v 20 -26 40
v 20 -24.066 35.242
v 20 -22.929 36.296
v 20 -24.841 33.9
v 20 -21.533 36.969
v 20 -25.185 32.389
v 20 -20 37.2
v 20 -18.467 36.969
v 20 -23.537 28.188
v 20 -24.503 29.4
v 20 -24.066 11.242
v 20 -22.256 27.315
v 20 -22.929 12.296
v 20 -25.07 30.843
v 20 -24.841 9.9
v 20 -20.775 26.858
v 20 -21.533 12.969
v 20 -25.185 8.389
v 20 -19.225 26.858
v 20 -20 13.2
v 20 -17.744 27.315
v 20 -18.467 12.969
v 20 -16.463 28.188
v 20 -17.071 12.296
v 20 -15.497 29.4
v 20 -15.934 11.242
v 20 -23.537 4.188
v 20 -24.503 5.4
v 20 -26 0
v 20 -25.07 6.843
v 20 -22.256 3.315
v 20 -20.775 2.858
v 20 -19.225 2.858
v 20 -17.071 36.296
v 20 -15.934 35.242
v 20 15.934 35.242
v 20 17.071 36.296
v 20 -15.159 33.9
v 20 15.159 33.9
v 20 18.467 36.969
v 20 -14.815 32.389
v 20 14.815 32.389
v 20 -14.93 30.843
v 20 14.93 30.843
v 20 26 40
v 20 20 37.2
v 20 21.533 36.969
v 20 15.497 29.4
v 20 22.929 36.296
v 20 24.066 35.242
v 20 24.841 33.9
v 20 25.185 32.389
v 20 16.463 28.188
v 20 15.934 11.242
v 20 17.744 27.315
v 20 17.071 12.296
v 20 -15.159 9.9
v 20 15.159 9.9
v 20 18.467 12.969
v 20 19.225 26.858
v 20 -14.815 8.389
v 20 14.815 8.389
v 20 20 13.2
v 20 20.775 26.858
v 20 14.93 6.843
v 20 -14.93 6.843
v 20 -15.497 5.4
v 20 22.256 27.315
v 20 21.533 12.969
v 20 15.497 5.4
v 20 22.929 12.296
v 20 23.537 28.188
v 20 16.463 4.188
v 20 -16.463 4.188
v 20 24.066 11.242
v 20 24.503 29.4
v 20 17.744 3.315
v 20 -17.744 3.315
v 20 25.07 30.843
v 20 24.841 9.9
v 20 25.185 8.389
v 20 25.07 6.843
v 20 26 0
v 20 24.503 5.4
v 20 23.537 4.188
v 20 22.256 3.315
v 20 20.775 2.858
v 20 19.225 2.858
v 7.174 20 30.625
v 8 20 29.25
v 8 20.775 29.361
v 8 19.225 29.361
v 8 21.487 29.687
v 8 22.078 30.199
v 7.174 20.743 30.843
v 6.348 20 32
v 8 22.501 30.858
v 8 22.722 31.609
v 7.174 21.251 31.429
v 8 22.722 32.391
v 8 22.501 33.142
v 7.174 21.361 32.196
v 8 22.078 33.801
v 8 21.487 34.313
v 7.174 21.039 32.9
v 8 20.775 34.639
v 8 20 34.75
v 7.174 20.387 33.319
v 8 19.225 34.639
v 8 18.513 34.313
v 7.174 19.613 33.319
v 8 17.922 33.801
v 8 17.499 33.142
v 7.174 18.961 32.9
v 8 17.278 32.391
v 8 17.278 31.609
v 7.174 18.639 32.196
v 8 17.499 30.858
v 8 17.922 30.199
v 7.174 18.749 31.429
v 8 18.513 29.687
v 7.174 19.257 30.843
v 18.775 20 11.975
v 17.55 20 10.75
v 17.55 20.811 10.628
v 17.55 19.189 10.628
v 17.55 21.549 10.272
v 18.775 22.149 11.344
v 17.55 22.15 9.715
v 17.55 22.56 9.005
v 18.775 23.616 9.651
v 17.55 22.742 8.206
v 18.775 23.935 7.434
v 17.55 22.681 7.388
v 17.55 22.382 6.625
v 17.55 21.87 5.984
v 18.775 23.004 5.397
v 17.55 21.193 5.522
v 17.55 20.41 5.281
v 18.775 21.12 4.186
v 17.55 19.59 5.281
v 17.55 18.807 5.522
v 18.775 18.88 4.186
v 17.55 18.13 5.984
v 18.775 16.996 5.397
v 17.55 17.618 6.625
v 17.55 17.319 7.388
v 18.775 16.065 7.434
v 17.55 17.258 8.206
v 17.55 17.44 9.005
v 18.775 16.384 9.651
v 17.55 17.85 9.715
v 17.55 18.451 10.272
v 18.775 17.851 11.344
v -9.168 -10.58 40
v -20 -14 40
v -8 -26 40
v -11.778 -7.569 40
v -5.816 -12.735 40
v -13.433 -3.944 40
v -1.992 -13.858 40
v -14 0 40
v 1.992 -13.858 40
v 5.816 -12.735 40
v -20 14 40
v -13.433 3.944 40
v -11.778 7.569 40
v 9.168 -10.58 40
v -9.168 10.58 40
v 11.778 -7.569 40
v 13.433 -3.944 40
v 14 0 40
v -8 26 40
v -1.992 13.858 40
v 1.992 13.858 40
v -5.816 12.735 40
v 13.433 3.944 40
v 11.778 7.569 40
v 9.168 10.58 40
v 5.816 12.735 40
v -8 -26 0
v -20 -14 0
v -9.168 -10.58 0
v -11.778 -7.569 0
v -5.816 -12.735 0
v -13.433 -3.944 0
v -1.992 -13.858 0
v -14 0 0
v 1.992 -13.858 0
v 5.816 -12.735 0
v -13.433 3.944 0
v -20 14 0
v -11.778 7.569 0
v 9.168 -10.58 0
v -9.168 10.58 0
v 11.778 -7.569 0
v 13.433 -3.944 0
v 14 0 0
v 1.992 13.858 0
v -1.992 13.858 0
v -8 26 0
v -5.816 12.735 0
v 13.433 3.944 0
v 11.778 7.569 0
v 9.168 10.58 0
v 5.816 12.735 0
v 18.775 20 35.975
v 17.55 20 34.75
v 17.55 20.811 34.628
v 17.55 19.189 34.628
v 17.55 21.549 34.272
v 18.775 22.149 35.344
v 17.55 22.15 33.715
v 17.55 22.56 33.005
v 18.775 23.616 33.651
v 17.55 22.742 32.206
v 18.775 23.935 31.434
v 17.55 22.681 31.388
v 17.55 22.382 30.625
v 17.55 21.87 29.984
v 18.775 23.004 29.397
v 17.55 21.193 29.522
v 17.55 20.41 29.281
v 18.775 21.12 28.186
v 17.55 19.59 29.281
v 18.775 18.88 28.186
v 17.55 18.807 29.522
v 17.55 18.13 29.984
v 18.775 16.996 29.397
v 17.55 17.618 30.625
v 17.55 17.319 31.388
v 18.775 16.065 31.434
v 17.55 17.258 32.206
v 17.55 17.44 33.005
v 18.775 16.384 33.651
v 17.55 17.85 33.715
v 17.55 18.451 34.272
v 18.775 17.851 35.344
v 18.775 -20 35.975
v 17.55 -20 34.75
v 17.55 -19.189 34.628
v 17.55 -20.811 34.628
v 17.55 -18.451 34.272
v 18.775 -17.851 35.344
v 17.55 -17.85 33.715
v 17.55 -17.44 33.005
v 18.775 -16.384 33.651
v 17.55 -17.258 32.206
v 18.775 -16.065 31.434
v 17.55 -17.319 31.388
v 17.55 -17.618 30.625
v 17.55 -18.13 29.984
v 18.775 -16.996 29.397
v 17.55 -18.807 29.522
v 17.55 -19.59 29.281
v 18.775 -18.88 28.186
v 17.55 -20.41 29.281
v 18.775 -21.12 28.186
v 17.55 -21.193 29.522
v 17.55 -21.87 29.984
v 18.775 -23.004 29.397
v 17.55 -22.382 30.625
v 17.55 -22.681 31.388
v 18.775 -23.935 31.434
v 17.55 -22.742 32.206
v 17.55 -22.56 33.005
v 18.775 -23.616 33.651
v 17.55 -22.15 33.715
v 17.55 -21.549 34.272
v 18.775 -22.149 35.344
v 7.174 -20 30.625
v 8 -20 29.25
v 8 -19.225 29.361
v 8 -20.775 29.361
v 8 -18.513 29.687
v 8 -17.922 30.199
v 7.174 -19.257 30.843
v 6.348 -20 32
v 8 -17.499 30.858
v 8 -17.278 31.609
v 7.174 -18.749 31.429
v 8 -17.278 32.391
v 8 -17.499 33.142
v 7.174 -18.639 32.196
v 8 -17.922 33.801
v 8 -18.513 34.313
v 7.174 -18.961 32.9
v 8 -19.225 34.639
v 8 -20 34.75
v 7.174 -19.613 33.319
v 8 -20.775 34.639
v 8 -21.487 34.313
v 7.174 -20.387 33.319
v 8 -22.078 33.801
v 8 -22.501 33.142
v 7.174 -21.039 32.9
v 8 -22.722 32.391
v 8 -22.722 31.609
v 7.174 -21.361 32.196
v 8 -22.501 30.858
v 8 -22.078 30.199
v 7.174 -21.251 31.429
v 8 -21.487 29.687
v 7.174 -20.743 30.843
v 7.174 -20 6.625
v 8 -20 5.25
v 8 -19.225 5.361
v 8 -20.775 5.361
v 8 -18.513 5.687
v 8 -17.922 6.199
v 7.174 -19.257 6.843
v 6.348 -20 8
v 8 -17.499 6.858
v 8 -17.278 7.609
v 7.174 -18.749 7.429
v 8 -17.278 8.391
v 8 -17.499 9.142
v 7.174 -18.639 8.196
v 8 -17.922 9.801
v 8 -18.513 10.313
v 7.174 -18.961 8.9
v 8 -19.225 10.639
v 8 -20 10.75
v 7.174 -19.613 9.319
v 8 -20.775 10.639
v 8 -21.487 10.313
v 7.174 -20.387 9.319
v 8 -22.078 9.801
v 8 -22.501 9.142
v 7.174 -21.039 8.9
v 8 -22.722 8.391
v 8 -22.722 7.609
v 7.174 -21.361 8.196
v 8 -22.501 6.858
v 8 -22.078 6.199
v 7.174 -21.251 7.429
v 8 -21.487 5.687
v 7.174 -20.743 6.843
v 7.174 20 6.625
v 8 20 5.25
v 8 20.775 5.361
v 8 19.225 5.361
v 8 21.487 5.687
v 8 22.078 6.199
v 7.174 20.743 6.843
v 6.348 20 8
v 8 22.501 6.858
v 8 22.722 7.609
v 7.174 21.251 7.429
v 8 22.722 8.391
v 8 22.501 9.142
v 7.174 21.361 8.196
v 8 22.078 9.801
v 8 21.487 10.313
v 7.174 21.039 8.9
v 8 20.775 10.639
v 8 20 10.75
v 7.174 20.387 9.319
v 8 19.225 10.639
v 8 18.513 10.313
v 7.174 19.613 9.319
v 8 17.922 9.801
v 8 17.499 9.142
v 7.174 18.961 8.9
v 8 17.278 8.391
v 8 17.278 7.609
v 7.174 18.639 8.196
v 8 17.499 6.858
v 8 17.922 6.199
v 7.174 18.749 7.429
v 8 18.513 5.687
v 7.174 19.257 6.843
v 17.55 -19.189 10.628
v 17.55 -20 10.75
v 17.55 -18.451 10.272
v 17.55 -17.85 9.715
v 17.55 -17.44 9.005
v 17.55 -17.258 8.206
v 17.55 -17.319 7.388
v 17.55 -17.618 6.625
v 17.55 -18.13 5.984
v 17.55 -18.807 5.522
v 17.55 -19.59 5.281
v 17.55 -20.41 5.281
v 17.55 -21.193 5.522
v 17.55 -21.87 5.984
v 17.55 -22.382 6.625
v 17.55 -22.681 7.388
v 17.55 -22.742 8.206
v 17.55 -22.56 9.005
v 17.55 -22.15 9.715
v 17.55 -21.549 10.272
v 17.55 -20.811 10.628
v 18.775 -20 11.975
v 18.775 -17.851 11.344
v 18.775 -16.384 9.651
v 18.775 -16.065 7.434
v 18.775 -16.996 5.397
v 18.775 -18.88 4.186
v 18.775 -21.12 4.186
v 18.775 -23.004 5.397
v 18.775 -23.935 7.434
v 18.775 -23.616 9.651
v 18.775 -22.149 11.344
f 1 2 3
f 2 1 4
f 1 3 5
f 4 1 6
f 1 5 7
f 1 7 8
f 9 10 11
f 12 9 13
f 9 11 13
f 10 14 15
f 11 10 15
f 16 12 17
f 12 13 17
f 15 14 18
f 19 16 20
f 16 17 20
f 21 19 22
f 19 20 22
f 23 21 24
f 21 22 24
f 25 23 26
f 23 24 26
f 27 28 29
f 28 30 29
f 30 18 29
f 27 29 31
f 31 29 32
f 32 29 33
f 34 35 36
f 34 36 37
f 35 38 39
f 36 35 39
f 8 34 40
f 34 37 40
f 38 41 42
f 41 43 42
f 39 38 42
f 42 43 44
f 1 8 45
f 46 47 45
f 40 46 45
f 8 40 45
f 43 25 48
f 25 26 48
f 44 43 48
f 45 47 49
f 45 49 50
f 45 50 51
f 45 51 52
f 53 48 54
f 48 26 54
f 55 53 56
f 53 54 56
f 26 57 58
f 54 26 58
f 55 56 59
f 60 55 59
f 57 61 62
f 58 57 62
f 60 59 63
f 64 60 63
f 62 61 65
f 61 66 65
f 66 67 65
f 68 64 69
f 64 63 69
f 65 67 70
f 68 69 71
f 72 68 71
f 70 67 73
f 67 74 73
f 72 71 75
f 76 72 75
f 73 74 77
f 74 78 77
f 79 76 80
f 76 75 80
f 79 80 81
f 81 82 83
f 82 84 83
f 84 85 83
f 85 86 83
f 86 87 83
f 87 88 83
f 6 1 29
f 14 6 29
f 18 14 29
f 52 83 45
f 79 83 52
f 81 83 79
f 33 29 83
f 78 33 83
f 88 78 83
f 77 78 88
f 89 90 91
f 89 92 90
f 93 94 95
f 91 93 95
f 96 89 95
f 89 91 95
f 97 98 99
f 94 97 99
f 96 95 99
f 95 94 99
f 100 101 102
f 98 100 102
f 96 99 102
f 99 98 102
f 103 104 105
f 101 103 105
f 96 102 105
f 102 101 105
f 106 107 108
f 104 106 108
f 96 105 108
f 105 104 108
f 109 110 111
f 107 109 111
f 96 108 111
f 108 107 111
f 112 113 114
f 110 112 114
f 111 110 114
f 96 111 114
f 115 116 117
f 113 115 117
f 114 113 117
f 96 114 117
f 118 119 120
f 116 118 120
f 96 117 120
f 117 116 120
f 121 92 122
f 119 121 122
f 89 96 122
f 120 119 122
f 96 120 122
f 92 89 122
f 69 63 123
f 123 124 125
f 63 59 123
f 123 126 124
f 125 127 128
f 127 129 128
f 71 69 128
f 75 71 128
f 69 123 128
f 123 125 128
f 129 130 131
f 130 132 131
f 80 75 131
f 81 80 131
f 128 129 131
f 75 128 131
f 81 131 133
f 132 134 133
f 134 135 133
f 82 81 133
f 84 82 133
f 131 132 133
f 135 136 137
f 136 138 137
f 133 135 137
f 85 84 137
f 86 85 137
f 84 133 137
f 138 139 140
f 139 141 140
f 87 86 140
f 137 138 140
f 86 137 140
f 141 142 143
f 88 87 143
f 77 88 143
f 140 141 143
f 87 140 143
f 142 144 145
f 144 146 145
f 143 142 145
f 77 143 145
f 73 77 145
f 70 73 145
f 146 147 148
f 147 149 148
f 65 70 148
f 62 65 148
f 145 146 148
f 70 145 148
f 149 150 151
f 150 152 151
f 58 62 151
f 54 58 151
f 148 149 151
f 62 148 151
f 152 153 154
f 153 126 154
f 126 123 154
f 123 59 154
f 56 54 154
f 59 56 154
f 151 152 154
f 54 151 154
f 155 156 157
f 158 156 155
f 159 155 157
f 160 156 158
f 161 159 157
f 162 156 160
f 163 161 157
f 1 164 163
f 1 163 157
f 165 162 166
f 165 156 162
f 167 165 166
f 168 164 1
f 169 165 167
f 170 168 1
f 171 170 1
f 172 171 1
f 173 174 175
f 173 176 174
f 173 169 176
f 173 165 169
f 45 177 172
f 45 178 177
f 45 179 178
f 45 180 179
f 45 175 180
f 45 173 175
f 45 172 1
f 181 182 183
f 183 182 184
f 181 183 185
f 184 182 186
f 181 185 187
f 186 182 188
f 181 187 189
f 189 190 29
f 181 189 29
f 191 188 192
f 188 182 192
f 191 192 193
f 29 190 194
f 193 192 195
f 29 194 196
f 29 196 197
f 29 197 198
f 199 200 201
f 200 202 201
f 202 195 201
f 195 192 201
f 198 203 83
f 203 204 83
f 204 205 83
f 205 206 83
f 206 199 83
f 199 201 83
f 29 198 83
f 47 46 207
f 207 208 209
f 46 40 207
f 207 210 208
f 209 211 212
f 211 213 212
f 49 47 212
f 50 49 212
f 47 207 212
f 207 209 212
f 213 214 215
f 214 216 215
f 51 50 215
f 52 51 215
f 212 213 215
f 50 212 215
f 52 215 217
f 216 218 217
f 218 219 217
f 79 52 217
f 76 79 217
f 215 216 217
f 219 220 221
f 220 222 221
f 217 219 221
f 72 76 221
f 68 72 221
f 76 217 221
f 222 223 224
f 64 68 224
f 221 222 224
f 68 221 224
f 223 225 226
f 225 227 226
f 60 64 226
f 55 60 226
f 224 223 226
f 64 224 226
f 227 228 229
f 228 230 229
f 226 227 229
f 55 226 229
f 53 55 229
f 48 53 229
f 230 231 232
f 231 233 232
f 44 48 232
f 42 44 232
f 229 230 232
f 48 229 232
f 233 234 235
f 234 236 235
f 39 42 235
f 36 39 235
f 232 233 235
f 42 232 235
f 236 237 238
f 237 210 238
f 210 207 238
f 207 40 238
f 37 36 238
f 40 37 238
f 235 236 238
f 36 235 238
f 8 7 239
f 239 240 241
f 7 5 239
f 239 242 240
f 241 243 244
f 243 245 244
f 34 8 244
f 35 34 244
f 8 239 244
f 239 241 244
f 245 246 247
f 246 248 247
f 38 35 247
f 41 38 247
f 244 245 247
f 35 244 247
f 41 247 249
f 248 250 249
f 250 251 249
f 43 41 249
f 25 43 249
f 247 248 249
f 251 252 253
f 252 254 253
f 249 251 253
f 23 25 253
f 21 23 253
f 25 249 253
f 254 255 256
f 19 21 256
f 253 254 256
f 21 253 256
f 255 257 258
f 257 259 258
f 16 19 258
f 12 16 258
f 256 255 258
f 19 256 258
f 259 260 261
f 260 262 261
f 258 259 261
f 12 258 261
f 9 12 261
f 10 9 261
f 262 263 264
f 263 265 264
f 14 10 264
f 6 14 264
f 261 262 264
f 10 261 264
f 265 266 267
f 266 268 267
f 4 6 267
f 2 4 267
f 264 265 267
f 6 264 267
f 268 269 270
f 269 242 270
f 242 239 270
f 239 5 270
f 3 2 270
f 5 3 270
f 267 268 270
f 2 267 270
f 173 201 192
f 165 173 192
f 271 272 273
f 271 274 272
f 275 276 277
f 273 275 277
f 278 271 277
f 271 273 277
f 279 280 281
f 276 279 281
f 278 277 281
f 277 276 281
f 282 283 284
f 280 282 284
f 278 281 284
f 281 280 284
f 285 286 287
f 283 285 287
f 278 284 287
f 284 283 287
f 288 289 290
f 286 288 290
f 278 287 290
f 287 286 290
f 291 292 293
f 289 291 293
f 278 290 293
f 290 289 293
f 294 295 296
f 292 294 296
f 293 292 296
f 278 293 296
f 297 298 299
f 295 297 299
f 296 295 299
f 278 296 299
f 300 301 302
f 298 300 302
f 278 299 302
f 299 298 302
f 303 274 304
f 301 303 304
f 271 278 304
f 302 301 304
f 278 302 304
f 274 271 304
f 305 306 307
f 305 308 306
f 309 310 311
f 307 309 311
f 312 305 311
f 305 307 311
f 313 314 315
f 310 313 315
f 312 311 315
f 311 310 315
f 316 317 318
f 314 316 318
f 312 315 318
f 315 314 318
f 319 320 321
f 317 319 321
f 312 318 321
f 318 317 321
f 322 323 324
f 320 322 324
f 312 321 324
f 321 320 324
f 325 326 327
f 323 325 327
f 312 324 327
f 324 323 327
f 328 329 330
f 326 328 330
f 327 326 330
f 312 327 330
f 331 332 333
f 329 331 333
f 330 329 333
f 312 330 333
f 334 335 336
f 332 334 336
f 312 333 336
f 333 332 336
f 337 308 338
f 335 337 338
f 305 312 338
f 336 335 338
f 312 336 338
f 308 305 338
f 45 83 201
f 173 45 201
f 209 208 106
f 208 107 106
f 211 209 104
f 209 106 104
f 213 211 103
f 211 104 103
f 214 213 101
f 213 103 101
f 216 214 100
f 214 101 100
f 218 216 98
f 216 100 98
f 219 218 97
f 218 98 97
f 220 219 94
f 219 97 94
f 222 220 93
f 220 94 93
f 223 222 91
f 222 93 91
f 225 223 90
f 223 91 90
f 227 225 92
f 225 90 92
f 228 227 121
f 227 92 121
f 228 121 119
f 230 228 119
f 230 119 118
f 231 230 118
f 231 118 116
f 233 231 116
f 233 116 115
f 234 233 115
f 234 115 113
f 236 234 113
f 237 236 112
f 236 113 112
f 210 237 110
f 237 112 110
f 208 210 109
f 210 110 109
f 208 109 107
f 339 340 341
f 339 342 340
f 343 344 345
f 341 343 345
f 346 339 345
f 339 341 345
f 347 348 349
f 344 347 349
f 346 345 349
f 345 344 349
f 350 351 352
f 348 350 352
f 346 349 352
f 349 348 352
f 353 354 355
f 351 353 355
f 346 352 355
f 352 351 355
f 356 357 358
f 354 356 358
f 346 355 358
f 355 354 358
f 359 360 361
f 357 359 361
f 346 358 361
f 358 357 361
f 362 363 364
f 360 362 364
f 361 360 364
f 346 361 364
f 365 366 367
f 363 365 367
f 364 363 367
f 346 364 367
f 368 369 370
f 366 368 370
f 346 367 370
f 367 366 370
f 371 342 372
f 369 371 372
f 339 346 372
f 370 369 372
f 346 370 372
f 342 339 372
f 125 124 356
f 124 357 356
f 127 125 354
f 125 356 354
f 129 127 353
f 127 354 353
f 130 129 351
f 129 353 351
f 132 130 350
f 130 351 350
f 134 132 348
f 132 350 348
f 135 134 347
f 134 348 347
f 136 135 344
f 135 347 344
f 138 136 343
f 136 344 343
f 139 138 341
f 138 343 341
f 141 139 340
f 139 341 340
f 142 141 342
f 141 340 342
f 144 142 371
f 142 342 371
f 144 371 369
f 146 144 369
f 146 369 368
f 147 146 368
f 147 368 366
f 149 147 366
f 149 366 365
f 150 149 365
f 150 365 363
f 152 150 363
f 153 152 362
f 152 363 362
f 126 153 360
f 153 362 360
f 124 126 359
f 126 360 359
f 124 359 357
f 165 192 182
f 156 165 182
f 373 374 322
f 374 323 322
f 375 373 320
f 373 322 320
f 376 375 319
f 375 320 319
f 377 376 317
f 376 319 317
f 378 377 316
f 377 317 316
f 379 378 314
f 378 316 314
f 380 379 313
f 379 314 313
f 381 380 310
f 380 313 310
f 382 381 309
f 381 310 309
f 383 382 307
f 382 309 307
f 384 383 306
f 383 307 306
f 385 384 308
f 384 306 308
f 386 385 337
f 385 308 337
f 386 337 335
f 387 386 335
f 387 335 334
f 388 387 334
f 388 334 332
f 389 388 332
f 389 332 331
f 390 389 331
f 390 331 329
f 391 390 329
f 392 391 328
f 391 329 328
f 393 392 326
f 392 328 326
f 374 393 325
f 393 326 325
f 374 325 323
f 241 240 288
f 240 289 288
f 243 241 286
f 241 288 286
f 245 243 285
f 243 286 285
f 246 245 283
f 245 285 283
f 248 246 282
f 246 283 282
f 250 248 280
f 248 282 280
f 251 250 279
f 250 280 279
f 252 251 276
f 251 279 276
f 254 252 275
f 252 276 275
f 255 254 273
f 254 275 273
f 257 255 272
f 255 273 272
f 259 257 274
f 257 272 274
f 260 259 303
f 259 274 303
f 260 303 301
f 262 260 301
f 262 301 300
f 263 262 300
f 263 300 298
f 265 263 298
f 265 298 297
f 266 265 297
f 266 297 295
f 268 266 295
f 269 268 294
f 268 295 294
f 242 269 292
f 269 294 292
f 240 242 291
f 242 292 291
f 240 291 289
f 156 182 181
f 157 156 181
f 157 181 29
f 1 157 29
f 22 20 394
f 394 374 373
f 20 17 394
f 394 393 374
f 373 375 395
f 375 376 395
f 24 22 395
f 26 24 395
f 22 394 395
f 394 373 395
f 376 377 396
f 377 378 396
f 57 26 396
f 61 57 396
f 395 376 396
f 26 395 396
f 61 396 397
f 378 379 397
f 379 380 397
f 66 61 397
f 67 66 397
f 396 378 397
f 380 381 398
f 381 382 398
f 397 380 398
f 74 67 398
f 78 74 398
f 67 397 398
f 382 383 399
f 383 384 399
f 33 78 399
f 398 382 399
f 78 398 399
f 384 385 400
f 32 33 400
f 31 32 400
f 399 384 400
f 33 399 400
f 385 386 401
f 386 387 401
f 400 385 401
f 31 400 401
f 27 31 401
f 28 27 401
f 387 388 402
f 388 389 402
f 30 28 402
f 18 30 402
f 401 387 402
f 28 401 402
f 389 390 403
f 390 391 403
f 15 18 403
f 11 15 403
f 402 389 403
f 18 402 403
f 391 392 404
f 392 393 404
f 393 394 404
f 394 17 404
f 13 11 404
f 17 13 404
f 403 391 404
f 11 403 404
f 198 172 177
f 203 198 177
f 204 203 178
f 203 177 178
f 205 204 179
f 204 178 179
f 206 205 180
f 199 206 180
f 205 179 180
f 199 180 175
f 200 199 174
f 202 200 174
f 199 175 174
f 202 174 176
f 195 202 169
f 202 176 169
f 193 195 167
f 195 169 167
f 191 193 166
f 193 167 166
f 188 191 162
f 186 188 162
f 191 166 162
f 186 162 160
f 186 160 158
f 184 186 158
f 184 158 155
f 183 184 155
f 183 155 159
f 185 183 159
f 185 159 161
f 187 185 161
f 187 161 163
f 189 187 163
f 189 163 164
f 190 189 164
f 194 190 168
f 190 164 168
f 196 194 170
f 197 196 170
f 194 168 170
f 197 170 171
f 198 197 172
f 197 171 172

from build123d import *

# Parameters (mm, degrees)
BOSS_EXTRUDE1_DEPTH                                  = 40
SKETCH2_R                                            = 14
CUT_EXTRUDE1_DEPTH                                   = 40
CSK_FOR_M5_COUNTERSUNK_RAISED_HEAD_SCREW_D           = 5.5
CSK_FOR_M5_COUNTERSUNK_RAISED_HEAD_SCREW_DEPTH       = 12
CSK_FOR_M5_COUNTERSUNK_RAISED_HEAD_SCREW_CSINK_D     = 10.4
CSK_FOR_M5_COUNTERSUNK_RAISED_HEAD_SCREW_CSINK_ANGLE = 90
CSK_FOR_M5_COUNTERSUNK_RAISED_HEAD_SCREW_TIP         = 1.652366702


with BuildPart() as part:
    # Sketch1 → Boss-Extrude1 (new body)
    with BuildSketch(Plane.XY):
        Polygon((-20, -14), (-8, -26), (20, -26), (20, 26), (-8, 26), (-20, 14), align=None)
    extrude(amount=BOSS_EXTRUDE1_DEPTH)

    # Sketch2 → Cut-Extrude1 (cut)
    with BuildSketch(Plane.XY.offset(40)):
        Circle(SKETCH2_R)
    extrude(amount=-CUT_EXTRUDE1_DEPTH, mode=Mode.SUBTRACT)

    # CSK for M5 Countersunk Raised Head Screw1
    with Locations(Plane(origin=(20, 0, 0), x_dir=(0, 0, -1), z_dir=(1, 0, 0))):
        with Locations((-32, 20), (-8, 20), (-8, -20), (-32, -20)):
            CounterSinkHole(CSK_FOR_M5_COUNTERSUNK_RAISED_HEAD_SCREW_D / 2, CSK_FOR_M5_COUNTERSUNK_RAISED_HEAD_SCREW_CSINK_D / 2, depth=CSK_FOR_M5_COUNTERSUNK_RAISED_HEAD_SCREW_DEPTH, counter_sink_angle=CSK_FOR_M5_COUNTERSUNK_RAISED_HEAD_SCREW_CSINK_ANGLE)
            with Locations((0, 0, -(CSK_FOR_M5_COUNTERSUNK_RAISED_HEAD_SCREW_DEPTH + CSK_FOR_M5_COUNTERSUNK_RAISED_HEAD_SCREW_TIP / 2))):  # 118° drill point
                Cone(0, CSK_FOR_M5_COUNTERSUNK_RAISED_HEAD_SCREW_D / 2, CSK_FOR_M5_COUNTERSUNK_RAISED_HEAD_SCREW_TIP, mode=Mode.SUBTRACT)


solid = part.part
